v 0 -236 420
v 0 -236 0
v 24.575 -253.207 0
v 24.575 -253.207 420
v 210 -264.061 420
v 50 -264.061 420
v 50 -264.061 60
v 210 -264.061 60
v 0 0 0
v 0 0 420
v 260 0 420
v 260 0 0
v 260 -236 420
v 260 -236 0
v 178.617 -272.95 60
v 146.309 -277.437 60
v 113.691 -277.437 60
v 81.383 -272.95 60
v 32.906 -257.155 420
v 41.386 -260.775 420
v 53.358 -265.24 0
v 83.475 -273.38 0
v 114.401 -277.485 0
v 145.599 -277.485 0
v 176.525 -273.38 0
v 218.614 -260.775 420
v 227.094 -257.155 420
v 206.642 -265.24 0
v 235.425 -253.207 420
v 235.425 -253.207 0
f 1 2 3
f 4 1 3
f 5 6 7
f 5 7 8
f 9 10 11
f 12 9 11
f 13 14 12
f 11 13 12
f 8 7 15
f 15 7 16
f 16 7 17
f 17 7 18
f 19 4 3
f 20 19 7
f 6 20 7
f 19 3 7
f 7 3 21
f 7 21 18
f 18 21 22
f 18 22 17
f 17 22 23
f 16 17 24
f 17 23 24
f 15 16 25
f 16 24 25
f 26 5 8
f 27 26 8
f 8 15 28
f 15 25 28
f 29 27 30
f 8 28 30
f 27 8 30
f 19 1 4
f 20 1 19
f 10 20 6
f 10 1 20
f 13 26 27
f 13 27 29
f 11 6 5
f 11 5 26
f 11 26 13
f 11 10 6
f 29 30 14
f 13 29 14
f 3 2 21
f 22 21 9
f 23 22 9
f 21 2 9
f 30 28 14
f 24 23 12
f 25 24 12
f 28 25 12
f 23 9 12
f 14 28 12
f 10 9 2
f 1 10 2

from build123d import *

# Parameters (mm, degrees)
F0_W     = 260
F0_H     = 420
F1_DEPTH = 230
F3_DEPTH = 420
F4_W     = 160
F4_H     = 76.108451
F5_DEPTH = 360


with BuildPart() as f1:
    # F0 (on Front) → F1 (new body)
    with BuildSketch(Plane.XZ):
        with Locations((130, 210)):
            Rectangle(F0_W, F0_H)
    extrude(amount=F1_DEPTH)

    # F2 (on Top) → F3 (join, through all)
    with BuildSketch(Plane.XY):
        with BuildLine():
            Line((260, -230), (0, -230))
            Line((0, -230), (0, -236))
            Line((0, -236), (24.574561, -253.207293))
            ThreePointArc((24.574561, -253.207293), (130, -278), (235.425439, -253.207293))
            Line((235.425439, -253.207293), (260, -236))
            Line((260, -236), (260, -230))
        make_face()
    extrude(amount=F3_DEPTH)

    # F4 (on face) → F5 (cut)
    with BuildSketch(Plane.XY.offset(420)):
        with Locations((130, -302.115488)):
            Rectangle(F4_W, F4_H)
    extrude(amount=-F5_DEPTH, mode=Mode.SUBTRACT)


solid = f1.part
